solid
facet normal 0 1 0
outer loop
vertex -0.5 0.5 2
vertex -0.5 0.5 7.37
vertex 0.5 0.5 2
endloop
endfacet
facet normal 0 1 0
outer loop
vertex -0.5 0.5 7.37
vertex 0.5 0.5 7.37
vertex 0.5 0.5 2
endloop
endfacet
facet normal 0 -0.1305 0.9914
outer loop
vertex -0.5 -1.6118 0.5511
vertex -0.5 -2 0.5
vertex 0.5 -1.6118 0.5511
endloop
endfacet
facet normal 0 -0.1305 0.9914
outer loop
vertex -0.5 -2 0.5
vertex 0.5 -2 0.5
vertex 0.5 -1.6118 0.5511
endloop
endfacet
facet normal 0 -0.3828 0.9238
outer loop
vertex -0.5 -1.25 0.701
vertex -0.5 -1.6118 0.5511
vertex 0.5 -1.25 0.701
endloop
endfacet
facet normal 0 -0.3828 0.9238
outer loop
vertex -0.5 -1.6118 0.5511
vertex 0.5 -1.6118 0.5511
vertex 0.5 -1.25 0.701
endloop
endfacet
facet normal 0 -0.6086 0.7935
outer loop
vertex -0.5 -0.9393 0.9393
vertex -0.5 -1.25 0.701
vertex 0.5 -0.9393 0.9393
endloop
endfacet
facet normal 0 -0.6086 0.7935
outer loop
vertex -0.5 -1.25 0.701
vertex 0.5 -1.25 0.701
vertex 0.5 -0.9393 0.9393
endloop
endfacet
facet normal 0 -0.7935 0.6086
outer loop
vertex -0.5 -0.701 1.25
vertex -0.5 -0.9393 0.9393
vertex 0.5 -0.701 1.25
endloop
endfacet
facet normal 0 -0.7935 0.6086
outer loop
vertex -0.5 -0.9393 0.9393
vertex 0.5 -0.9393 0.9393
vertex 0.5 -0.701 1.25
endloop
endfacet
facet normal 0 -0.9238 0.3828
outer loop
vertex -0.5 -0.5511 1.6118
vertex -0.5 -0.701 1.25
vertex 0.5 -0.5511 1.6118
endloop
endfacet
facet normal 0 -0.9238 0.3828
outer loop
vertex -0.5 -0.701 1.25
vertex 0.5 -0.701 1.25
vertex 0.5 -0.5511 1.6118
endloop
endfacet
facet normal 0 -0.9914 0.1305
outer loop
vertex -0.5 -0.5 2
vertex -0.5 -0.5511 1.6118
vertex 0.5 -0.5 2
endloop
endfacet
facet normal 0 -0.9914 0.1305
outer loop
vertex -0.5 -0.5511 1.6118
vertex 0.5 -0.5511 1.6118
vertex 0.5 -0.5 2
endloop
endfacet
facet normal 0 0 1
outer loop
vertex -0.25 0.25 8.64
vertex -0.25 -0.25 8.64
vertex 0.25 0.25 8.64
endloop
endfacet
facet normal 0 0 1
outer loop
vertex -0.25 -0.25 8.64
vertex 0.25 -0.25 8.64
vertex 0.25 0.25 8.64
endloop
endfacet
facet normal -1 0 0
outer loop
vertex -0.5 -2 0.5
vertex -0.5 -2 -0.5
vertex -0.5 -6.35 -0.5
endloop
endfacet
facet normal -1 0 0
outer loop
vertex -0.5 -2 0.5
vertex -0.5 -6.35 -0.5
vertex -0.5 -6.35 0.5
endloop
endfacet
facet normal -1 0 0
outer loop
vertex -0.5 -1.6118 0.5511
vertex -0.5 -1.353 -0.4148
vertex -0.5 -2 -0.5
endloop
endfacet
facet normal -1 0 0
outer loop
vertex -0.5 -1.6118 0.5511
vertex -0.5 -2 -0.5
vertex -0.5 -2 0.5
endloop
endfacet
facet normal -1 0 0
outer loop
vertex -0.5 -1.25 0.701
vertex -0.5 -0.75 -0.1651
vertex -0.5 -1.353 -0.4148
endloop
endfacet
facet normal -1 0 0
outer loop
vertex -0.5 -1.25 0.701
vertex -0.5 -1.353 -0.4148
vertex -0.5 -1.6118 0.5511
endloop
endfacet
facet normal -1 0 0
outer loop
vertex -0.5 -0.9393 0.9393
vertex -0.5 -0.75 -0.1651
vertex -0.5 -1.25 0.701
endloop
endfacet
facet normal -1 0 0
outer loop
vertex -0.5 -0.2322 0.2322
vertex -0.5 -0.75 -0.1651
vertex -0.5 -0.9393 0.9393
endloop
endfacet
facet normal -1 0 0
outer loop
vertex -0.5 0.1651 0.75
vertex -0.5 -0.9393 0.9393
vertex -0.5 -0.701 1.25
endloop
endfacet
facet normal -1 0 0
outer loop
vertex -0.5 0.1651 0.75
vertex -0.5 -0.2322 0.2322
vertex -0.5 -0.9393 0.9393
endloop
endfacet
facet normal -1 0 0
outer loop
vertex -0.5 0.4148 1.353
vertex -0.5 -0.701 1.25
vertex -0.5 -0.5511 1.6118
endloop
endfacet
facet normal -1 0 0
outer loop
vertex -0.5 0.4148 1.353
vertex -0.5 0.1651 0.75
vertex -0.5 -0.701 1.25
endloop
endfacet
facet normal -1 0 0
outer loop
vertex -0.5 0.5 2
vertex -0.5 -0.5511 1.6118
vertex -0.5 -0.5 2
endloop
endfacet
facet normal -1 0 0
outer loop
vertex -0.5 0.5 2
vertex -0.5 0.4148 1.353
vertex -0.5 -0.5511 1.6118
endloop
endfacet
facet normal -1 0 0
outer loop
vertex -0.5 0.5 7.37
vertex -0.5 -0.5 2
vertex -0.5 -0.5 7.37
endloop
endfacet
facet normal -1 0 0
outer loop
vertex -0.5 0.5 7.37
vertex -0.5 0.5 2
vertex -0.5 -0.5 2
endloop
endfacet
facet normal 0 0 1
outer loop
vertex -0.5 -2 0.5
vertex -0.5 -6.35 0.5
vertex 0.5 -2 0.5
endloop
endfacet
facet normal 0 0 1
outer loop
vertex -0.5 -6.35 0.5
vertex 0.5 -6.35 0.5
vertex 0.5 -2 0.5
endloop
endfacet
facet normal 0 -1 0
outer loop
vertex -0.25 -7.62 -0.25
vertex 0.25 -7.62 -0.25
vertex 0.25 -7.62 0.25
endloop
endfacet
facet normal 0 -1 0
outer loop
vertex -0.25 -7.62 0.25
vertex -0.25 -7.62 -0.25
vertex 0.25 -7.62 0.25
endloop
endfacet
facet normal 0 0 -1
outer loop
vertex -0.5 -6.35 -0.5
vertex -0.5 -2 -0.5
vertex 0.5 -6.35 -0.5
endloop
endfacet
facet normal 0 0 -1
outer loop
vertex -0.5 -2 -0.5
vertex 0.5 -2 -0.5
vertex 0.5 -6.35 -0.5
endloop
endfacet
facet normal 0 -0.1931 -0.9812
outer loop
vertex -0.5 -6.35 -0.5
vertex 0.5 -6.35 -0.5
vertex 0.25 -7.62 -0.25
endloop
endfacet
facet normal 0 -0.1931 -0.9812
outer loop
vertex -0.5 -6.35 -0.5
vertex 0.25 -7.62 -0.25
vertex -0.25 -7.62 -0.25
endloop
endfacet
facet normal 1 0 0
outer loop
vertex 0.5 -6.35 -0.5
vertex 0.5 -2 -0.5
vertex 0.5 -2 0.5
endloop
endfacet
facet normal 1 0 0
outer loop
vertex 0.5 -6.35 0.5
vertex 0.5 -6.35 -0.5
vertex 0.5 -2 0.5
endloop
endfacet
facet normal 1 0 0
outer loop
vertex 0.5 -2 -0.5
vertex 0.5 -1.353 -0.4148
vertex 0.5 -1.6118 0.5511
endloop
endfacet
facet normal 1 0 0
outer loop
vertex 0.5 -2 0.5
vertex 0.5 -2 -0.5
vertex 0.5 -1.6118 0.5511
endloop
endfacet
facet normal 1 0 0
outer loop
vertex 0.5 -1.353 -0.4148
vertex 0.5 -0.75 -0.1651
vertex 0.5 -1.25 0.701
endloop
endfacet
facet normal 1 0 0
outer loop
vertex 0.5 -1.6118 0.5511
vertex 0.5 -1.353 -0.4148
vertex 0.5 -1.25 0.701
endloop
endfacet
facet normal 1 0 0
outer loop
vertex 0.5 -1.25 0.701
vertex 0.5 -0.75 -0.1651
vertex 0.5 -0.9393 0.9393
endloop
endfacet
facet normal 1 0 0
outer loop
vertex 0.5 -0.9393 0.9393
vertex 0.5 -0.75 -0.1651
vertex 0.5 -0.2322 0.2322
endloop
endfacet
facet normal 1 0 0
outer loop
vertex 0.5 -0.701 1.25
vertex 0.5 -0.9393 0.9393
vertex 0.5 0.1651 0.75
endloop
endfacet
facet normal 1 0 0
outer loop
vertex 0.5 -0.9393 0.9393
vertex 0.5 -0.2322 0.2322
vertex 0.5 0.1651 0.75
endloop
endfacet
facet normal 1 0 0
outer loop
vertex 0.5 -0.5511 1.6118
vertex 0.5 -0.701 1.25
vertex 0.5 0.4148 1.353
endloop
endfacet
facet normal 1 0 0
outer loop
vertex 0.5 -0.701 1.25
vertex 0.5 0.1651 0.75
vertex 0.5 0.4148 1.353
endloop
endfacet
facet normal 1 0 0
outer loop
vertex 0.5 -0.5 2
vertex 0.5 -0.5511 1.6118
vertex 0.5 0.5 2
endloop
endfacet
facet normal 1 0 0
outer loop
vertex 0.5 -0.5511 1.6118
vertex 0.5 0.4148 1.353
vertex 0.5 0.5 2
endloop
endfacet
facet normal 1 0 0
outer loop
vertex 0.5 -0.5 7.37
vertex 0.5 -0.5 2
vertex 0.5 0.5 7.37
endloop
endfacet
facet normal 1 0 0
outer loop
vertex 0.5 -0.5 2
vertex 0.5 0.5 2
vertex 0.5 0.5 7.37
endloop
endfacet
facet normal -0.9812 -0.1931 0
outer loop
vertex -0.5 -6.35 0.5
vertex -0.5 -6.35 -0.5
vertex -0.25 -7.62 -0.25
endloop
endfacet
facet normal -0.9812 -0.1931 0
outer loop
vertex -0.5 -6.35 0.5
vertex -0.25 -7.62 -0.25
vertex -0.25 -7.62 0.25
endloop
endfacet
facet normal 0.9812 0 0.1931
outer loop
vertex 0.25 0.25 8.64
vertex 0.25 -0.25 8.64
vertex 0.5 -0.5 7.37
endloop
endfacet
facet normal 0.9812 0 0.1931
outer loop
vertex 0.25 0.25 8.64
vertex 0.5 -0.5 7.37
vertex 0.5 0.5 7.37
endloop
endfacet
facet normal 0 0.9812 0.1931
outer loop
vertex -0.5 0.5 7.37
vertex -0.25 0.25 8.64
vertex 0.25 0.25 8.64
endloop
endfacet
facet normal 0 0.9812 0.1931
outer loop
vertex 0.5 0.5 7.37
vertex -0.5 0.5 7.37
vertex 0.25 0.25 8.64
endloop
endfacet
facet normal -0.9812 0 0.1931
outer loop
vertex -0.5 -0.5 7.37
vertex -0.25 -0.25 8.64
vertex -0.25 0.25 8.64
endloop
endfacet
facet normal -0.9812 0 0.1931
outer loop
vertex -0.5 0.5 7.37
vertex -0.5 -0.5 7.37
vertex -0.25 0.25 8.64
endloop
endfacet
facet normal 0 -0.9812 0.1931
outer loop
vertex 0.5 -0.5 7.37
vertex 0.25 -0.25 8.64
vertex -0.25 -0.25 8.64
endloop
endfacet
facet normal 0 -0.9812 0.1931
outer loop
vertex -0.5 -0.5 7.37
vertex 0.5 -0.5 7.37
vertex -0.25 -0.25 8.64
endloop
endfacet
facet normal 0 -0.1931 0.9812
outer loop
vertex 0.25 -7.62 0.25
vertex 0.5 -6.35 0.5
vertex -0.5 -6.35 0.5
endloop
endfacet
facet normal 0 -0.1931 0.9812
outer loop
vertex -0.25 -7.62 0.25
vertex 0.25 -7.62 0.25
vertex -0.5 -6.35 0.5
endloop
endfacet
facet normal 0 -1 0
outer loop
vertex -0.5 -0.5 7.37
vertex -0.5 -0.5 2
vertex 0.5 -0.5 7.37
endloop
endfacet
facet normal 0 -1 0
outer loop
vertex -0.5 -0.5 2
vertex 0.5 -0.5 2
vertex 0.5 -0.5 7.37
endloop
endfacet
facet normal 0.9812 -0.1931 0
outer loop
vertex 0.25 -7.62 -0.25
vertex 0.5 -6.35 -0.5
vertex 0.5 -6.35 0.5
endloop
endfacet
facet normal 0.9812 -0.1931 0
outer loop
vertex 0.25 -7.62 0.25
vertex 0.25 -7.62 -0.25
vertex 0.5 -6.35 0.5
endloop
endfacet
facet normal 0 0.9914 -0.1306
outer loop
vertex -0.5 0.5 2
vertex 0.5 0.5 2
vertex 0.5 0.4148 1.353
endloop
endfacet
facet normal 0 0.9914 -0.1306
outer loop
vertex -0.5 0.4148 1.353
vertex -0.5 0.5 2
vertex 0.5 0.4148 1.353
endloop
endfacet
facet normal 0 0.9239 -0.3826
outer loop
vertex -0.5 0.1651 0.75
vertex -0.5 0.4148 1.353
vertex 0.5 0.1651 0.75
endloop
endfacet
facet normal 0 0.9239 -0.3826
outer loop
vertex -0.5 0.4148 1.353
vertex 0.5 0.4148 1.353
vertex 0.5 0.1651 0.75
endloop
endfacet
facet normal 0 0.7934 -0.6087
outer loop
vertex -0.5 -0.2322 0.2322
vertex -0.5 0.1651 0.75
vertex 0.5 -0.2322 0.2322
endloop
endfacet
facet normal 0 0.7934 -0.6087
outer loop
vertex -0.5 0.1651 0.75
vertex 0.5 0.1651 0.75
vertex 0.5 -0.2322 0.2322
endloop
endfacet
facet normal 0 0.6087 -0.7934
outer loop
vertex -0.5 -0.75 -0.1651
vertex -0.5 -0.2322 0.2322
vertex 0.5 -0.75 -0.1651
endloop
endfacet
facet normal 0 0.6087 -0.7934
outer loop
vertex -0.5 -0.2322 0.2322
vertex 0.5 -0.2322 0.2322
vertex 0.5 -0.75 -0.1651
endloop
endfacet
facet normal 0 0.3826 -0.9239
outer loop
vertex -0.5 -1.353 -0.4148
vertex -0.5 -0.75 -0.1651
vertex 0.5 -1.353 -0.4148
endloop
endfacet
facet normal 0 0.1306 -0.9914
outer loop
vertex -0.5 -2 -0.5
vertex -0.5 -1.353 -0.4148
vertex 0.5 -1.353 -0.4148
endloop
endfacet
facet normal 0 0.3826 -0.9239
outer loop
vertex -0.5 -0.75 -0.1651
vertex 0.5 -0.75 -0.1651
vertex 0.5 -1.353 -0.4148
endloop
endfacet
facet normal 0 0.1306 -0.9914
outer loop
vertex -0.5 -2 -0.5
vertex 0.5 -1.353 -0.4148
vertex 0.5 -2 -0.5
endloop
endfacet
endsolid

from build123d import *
from OCP.BRepFilletAPI import BRepFilletAPI_MakeChamfer

# Parameters (mm, degrees)
BOSS_EXTRUDE1_DEPTH = 0.5
CHAMFER1_SIZE       = 1.27
CHAMFER1_SIZE2      = 0.25
CHAMFER2_SIZE       = 0.25
CHAMFER2_SIZE2      = 1.27


with BuildPart() as part:
    # Sketch1 → Boss-Extrude1 (new, symmetric)
    with BuildSketch(Plane(origin=(0, 0, 0), x_dir=(0, 0, -1), z_dir=(1, 0, 0))):
        with BuildLine():
            Line((0.5, -2), (0.5, -7.62))
            Line((0.5, -7.62), (-0.5, -7.62))
            Line((-0.5, -7.62), (-0.5, -2))
            ThreePointArc((-0.5, -2), (-0.939339828, -0.939339828), (-2, -0.5))
            Line((-2, -0.5), (-8.64, -0.5))
            Line((-8.64, -0.5), (-8.64, 0.5))
            Line((-8.64, 0.5), (-2, 0.5))
            ThreePointArc((-2, 0.5), (-0.232233047, -0.232233047), (0.5, -2))
        make_face()
    extrude(amount=BOSS_EXTRUDE1_DEPTH, both=True)

    # Chamfer1: one chamfer whose edges measure the first distance from different faces: ONE call of the kernel's chamfer builder (chamfer() names one face for all edges)
    chamfer1_edges_1 = [part.edges().sort_by_distance(p)[0] for p in [
        (-0.5, 0, 8.64),
    ]]
    chamfer1_side_1 = [part.faces().sort_by_distance(p)[0] for p in [
        (-0.5, -4.81, -0.37774044),
    ]]
    chamfer1_edges_2 = [part.edges().sort_by_distance(p)[0] for p in [
        (0.5, 0, 8.64),
    ]]
    chamfer1_side_2 = [part.faces().sort_by_distance(p)[0] for p in [
        (0.5, -4.81, -0.37774044),
    ]]
    chamfer1_edges_3 = [part.edges().sort_by_distance(p)[0] for p in [
        (0, -0.5, 8.64),
    ]]
    chamfer1_side_3 = [part.faces().sort_by_distance(p)[0] for p in [
        (0, -0.5, 5.32),
    ]]
    chamfer1_edges_4 = [part.edges().sort_by_distance(p)[0] for p in [
        (0, 0.5, 8.64),
    ]]
    chamfer1_side_4 = [part.faces().sort_by_distance(p)[0] for p in [
        (0, 0.5, 5.32),
    ]]
    chamfer1 = BRepFilletAPI_MakeChamfer(part.part.solid().wrapped)
    for e in chamfer1_edges_1:
        chamfer1.Add(CHAMFER1_SIZE, CHAMFER1_SIZE2, e.wrapped, chamfer1_side_1[0].wrapped)  # the first distance lies on this face
    for e in chamfer1_edges_2:
        chamfer1.Add(CHAMFER1_SIZE, CHAMFER1_SIZE2, e.wrapped, chamfer1_side_2[0].wrapped)  # the first distance lies on this face
    for e in chamfer1_edges_3:
        chamfer1.Add(CHAMFER1_SIZE, CHAMFER1_SIZE2, e.wrapped, chamfer1_side_3[0].wrapped)  # the first distance lies on this face
    for e in chamfer1_edges_4:
        chamfer1.Add(CHAMFER1_SIZE, CHAMFER1_SIZE2, e.wrapped, chamfer1_side_4[0].wrapped)  # the first distance lies on this face
    add(Compound.cast(chamfer1.Shape()), mode=Mode.REPLACE)

    # Chamfer2
    chamfer2_edges = [part.edges().sort_by_distance(p)[0] for p in [
        (0, -7.62, -0.5),
        (0, -7.62, 0.5),
        (0.5, -7.62, 0),
        (-0.5, -7.62, 0),
    ]]
    chamfer2_side = [part.faces().sort_by_distance(p)[0] for p in [
        (0, -7.62, 0),
    ]]
    chamfer(chamfer2_edges, length=CHAMFER2_SIZE, length2=CHAMFER2_SIZE2, reference=chamfer2_side[0])


solid = part.part
